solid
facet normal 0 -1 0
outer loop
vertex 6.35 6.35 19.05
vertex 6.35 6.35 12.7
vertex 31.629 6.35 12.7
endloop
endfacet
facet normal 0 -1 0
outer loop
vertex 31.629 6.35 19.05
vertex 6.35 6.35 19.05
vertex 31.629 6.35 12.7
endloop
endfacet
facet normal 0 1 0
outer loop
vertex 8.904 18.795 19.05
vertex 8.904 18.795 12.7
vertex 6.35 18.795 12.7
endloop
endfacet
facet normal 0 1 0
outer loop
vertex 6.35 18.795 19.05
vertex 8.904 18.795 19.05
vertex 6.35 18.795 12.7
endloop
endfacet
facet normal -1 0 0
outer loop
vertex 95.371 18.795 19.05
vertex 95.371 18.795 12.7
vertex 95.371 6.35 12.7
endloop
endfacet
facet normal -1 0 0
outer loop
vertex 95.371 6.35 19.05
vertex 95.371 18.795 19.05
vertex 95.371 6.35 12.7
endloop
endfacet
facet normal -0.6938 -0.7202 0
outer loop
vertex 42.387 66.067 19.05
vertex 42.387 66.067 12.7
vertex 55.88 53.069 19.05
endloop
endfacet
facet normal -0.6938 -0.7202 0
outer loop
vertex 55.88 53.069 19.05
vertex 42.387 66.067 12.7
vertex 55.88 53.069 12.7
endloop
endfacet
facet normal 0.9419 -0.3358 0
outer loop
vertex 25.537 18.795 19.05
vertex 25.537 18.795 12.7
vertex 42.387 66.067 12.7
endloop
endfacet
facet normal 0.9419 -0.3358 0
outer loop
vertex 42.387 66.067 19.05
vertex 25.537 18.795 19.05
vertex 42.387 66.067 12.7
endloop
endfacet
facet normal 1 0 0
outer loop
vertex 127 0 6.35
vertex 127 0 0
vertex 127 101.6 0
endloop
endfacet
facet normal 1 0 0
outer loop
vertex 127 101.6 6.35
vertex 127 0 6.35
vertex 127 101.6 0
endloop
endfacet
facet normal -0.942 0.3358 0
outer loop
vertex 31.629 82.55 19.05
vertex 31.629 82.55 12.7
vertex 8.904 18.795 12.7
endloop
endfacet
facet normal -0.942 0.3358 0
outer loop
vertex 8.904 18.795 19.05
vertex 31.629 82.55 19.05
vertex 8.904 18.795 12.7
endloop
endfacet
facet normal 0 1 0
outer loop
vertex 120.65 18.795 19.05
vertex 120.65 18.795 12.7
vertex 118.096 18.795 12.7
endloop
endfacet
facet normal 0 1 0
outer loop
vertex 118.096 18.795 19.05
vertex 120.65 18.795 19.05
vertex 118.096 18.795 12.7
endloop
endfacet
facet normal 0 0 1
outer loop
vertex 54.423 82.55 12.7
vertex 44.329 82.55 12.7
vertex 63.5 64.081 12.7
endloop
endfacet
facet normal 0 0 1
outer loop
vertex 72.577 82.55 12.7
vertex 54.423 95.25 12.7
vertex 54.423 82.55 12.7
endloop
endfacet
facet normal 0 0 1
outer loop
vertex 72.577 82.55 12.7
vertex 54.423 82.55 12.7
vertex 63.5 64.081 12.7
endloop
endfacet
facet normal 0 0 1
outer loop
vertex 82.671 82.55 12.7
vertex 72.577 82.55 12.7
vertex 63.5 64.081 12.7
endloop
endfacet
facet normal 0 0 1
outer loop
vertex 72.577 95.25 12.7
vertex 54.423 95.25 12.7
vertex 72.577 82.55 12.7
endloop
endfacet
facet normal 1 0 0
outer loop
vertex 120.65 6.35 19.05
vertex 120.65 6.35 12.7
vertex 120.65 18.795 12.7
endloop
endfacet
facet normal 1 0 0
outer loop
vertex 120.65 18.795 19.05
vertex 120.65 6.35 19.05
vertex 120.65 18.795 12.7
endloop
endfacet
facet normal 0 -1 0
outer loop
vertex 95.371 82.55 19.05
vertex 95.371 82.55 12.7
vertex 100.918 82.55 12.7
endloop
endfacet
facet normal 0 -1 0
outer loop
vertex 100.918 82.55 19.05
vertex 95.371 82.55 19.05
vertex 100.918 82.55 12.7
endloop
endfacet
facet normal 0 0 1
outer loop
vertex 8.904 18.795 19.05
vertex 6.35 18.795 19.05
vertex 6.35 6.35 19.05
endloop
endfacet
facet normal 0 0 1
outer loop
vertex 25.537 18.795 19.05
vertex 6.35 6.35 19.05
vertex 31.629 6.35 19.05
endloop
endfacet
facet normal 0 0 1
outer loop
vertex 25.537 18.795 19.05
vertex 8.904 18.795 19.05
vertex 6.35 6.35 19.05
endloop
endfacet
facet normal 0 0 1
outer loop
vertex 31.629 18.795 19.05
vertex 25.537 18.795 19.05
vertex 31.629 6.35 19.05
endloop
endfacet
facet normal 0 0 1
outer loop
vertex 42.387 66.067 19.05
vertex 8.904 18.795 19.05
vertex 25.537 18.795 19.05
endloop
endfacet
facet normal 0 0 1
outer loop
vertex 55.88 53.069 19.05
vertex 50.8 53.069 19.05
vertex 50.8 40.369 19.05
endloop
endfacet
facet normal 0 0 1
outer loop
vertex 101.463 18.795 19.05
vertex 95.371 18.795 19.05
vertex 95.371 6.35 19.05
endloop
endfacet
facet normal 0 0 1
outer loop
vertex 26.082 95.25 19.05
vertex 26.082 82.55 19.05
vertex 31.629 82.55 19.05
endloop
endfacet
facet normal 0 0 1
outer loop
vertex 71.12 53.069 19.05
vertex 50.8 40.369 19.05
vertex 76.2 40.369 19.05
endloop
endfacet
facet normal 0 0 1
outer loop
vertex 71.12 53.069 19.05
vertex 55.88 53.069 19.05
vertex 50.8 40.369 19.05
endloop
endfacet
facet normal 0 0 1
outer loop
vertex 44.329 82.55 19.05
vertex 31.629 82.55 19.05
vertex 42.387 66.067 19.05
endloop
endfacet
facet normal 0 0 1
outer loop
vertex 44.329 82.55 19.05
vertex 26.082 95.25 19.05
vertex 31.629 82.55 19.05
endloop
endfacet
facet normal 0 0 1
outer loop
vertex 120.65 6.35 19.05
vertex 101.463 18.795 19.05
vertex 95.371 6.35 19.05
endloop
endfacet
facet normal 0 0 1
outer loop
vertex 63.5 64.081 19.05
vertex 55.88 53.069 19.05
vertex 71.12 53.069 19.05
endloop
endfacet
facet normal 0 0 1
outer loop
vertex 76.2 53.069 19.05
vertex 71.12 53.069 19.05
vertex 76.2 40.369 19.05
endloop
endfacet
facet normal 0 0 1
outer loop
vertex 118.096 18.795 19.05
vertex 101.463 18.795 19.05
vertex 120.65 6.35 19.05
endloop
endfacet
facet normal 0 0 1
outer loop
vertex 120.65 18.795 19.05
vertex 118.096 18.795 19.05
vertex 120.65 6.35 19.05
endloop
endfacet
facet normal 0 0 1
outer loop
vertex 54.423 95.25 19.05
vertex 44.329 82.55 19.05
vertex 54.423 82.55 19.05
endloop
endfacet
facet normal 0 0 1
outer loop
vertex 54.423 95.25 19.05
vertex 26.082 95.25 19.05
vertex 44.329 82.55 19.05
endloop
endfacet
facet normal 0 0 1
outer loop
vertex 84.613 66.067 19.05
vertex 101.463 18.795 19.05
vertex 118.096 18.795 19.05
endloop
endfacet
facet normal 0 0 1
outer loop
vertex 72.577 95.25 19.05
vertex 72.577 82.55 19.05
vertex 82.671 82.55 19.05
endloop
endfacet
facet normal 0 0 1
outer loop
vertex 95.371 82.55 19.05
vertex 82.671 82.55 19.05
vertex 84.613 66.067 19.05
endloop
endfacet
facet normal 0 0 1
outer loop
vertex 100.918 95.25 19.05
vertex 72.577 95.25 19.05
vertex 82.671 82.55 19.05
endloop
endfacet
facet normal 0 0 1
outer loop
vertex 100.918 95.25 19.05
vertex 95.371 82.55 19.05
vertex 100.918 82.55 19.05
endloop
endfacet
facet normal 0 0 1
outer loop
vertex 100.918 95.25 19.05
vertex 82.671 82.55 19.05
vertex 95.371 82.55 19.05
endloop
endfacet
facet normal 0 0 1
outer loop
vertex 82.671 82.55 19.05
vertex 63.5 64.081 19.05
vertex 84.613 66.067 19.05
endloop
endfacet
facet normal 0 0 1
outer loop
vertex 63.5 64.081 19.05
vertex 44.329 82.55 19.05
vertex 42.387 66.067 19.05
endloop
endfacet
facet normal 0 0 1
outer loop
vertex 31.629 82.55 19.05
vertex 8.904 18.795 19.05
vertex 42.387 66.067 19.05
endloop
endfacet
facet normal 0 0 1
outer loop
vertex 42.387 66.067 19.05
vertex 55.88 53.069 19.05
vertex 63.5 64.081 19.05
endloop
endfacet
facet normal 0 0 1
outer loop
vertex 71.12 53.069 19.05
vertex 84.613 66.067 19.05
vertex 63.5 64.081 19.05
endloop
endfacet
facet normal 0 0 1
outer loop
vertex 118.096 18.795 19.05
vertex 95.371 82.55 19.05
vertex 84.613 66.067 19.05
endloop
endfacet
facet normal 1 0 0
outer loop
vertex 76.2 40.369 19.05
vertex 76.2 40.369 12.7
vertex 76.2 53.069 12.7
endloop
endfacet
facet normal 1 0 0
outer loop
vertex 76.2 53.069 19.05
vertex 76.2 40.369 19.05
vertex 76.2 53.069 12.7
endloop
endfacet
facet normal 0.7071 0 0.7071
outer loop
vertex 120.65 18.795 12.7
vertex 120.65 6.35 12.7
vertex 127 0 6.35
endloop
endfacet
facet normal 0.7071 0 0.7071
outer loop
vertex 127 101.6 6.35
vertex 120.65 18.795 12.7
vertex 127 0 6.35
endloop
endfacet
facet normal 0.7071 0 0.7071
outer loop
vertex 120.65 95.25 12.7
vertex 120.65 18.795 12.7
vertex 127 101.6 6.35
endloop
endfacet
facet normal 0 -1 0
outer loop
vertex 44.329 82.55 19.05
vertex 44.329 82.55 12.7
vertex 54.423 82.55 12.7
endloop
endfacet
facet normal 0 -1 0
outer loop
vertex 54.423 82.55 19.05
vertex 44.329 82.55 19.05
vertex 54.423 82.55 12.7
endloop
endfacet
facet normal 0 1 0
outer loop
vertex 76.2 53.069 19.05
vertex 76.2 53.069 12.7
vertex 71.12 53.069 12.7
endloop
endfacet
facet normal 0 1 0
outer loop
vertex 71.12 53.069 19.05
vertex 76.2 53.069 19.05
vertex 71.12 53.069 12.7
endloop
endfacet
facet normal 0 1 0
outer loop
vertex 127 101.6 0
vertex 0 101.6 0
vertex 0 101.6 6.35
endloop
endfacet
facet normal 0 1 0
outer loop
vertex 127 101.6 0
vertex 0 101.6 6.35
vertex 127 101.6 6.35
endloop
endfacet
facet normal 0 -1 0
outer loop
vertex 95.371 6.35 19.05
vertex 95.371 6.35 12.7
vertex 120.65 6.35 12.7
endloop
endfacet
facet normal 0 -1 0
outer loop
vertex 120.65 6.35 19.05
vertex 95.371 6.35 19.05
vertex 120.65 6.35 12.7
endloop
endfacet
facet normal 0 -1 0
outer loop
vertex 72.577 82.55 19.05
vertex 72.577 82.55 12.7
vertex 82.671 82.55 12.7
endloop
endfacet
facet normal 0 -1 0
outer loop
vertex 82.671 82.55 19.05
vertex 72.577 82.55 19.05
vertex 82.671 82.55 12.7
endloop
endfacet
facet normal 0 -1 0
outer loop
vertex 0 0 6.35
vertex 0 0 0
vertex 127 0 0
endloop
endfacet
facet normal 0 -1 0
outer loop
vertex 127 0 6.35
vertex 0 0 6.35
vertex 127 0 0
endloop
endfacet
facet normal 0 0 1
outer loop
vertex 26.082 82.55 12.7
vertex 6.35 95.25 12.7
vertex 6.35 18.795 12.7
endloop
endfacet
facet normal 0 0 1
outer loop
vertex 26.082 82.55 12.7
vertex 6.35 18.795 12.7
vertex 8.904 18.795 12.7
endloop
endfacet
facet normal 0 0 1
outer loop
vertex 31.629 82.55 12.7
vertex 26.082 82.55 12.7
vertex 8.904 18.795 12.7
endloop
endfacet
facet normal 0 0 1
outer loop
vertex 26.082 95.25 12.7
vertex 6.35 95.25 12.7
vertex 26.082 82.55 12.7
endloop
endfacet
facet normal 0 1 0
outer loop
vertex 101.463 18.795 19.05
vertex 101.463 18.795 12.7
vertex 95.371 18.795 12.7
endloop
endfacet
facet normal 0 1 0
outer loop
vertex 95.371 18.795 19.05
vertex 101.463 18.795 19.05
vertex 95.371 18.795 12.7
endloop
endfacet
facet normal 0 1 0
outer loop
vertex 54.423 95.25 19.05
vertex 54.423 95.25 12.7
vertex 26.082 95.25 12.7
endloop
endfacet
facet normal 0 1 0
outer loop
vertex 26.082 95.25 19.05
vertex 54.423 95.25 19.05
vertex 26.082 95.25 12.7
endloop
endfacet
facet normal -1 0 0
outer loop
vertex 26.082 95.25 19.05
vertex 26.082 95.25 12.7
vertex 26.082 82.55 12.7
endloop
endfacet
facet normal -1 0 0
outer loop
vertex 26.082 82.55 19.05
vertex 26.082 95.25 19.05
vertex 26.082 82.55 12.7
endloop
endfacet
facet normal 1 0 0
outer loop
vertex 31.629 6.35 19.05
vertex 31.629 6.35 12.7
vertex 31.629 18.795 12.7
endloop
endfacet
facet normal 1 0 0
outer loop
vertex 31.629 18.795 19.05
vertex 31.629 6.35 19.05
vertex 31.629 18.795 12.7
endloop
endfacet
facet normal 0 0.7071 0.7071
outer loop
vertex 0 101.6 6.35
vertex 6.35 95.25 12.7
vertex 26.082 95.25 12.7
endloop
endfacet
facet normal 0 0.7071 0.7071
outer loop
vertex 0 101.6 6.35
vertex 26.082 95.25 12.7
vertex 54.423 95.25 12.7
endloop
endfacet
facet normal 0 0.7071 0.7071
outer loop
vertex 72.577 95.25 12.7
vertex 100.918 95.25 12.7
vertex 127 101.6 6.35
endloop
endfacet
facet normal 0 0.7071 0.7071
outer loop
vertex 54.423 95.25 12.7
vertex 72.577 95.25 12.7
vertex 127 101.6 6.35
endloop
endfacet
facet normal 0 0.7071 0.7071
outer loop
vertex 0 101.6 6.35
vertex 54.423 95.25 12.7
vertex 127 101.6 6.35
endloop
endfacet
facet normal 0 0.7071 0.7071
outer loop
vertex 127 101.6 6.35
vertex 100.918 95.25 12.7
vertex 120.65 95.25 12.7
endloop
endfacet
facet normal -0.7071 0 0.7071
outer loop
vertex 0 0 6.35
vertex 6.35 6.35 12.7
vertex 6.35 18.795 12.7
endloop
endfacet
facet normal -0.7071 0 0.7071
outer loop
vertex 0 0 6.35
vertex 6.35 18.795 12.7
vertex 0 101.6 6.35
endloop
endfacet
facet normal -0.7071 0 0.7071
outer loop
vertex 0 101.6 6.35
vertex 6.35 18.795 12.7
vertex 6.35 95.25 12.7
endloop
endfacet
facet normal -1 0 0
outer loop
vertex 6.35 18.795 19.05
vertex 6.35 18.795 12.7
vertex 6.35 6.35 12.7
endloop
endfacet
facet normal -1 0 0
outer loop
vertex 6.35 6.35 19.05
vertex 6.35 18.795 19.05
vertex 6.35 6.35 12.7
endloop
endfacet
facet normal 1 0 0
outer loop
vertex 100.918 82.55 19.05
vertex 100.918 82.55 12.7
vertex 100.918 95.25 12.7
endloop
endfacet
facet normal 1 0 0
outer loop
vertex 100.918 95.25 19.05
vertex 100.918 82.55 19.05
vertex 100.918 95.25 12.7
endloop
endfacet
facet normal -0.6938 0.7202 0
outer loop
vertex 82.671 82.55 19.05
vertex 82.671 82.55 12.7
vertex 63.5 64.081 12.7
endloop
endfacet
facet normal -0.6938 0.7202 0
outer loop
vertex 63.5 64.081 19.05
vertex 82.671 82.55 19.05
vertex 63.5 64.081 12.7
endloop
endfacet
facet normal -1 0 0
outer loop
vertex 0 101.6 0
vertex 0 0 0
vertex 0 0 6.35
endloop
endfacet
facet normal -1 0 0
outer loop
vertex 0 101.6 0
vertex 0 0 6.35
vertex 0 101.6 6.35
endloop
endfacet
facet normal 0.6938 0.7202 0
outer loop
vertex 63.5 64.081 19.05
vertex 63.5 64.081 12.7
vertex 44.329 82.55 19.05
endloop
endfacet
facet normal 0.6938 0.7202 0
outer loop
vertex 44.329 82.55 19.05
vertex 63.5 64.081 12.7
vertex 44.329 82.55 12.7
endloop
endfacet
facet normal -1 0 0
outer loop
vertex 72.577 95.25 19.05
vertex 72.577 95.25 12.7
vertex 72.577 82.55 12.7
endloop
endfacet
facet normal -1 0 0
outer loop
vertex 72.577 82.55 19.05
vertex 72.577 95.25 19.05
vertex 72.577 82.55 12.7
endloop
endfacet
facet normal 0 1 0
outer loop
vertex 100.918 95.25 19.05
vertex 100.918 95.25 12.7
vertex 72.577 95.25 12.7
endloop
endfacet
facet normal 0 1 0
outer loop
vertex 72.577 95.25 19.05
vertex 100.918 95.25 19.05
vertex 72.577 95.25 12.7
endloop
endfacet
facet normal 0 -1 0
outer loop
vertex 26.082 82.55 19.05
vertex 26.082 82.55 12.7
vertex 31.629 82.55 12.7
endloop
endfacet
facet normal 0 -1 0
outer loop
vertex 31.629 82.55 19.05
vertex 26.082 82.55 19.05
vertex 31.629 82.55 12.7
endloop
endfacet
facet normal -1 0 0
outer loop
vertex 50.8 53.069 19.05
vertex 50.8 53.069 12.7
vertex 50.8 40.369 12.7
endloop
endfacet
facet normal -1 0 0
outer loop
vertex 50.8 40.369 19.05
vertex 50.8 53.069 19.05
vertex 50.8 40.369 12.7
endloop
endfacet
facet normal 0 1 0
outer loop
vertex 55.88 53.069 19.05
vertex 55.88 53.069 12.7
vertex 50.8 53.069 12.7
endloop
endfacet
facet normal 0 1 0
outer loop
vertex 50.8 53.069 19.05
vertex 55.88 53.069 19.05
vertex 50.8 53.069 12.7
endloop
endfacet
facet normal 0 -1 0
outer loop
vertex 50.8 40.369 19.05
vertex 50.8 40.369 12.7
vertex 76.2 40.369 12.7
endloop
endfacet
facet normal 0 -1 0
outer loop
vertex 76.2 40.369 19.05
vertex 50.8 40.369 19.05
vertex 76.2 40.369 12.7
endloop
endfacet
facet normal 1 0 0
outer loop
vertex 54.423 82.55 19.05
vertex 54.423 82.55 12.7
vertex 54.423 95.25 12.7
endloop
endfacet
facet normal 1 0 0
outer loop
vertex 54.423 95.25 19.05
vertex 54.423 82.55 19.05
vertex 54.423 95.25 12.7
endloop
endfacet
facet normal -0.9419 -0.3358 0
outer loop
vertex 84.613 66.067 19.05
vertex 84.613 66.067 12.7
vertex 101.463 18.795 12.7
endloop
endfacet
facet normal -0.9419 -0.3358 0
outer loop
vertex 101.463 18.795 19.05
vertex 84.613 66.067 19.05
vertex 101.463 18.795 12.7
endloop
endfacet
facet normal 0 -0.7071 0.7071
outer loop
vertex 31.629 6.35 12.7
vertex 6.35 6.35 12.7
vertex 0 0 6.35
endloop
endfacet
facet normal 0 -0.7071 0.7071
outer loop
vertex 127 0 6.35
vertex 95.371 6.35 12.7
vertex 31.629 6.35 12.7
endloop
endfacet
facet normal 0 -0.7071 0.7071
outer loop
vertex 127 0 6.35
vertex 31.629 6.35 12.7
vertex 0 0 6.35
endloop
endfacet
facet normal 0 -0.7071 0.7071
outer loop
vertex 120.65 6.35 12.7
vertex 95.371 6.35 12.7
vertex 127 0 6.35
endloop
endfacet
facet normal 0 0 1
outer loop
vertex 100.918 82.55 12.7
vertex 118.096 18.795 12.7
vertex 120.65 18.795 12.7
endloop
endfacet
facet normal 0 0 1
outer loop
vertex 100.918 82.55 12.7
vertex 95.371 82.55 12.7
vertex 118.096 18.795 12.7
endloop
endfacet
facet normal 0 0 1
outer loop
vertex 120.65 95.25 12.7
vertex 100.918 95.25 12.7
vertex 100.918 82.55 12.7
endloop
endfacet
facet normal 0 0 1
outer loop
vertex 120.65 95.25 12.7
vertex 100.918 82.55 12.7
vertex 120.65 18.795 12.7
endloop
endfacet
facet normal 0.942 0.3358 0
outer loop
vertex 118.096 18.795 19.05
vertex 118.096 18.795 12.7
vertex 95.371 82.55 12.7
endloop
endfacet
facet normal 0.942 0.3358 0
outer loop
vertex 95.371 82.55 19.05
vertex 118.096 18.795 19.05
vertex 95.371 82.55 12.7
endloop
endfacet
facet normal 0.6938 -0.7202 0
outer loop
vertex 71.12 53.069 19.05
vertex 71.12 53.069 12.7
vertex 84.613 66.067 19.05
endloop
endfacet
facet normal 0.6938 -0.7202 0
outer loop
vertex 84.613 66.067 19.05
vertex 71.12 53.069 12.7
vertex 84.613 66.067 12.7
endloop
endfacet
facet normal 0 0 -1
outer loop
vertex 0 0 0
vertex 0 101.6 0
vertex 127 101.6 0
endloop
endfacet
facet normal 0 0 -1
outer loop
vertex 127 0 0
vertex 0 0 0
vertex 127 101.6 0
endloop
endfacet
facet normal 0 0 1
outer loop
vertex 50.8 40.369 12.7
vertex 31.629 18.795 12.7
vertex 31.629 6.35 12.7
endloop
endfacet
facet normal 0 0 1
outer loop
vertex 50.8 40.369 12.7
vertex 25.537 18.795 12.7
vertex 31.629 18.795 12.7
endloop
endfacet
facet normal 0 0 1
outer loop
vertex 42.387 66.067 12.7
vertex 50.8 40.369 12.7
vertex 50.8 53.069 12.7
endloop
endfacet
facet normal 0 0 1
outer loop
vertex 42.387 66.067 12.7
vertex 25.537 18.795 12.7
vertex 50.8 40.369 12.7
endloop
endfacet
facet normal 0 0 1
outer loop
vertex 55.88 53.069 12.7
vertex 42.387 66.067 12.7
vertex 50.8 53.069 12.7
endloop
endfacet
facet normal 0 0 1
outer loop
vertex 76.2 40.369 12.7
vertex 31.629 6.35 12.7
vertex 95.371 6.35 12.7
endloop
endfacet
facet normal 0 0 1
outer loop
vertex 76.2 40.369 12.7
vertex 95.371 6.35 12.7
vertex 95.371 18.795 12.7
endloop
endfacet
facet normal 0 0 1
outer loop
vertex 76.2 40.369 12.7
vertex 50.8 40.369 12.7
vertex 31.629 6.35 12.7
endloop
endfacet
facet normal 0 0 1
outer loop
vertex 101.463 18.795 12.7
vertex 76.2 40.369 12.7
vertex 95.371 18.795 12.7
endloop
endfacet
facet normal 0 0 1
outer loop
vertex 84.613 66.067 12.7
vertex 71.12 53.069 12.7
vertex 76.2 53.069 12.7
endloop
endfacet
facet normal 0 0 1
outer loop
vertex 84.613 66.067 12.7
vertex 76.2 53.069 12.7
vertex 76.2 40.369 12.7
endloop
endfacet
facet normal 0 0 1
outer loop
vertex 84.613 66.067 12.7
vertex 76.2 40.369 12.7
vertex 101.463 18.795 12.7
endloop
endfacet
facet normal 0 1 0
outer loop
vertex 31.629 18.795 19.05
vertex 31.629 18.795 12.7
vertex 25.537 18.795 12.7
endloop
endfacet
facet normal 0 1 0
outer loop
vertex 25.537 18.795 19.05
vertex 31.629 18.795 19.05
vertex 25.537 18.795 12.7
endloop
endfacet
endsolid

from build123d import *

# Parameters (mm, degrees)
F0_W     = 127
F0_H     = 101.6
F1_DEPTH = 12.7
F2_SIZE  = 6.35
F4_DEPTH = 6.35


with BuildPart() as f1:
    # F0 (on Top) → F1 (new body)
    with BuildSketch(Plane.XY):
        with Locations((63.5, 50.8)):
            Rectangle(F0_W, F0_H)
    extrude(amount=F1_DEPTH)

    # F2
    f2_edges = [f1.edges().sort_by_distance(p)[0] for p in [
        (0, 50.8, 12.7),
        (63.5, 101.6, 12.7),
        (127, 50.8, 12.7),
        (63.5, 0, 12.7),
    ]]
    chamfer(f2_edges, length=F2_SIZE)

    # F3 (on face) → F4 (join)
    with BuildSketch(Plane.XY.offset(12.7)):
        Polygon((82.67119, 82.55), (63.5, 64.081497), (44.32881, 82.55), (54.423093, 82.55), (54.423093, 95.25), (26.081875, 95.25), (26.081875, 82.55), (31.62881, 82.55), (8.904249, 18.794981), (6.35, 18.794981), (6.35, 6.35), (31.62881, 6.35), (31.62881, 18.794981), (25.537017, 18.794981), (42.386614, 66.067462), (55.88, 53.068654), (50.8, 53.068654), (50.8, 40.368654), (76.2, 40.368654), (76.2, 53.068654), (71.12, 53.068654), (84.613386, 66.067462), (101.462983, 18.794981), (95.37119, 18.794981), (95.37119, 6.35), (120.65, 6.35), (120.65, 18.794981), (118.095751, 18.794981), (95.37119, 82.55), (100.918125, 82.55), (100.918125, 95.25), (72.576907, 95.25), (72.576907, 82.55), align=None)
    extrude(amount=F4_DEPTH)


solid = f1.part
